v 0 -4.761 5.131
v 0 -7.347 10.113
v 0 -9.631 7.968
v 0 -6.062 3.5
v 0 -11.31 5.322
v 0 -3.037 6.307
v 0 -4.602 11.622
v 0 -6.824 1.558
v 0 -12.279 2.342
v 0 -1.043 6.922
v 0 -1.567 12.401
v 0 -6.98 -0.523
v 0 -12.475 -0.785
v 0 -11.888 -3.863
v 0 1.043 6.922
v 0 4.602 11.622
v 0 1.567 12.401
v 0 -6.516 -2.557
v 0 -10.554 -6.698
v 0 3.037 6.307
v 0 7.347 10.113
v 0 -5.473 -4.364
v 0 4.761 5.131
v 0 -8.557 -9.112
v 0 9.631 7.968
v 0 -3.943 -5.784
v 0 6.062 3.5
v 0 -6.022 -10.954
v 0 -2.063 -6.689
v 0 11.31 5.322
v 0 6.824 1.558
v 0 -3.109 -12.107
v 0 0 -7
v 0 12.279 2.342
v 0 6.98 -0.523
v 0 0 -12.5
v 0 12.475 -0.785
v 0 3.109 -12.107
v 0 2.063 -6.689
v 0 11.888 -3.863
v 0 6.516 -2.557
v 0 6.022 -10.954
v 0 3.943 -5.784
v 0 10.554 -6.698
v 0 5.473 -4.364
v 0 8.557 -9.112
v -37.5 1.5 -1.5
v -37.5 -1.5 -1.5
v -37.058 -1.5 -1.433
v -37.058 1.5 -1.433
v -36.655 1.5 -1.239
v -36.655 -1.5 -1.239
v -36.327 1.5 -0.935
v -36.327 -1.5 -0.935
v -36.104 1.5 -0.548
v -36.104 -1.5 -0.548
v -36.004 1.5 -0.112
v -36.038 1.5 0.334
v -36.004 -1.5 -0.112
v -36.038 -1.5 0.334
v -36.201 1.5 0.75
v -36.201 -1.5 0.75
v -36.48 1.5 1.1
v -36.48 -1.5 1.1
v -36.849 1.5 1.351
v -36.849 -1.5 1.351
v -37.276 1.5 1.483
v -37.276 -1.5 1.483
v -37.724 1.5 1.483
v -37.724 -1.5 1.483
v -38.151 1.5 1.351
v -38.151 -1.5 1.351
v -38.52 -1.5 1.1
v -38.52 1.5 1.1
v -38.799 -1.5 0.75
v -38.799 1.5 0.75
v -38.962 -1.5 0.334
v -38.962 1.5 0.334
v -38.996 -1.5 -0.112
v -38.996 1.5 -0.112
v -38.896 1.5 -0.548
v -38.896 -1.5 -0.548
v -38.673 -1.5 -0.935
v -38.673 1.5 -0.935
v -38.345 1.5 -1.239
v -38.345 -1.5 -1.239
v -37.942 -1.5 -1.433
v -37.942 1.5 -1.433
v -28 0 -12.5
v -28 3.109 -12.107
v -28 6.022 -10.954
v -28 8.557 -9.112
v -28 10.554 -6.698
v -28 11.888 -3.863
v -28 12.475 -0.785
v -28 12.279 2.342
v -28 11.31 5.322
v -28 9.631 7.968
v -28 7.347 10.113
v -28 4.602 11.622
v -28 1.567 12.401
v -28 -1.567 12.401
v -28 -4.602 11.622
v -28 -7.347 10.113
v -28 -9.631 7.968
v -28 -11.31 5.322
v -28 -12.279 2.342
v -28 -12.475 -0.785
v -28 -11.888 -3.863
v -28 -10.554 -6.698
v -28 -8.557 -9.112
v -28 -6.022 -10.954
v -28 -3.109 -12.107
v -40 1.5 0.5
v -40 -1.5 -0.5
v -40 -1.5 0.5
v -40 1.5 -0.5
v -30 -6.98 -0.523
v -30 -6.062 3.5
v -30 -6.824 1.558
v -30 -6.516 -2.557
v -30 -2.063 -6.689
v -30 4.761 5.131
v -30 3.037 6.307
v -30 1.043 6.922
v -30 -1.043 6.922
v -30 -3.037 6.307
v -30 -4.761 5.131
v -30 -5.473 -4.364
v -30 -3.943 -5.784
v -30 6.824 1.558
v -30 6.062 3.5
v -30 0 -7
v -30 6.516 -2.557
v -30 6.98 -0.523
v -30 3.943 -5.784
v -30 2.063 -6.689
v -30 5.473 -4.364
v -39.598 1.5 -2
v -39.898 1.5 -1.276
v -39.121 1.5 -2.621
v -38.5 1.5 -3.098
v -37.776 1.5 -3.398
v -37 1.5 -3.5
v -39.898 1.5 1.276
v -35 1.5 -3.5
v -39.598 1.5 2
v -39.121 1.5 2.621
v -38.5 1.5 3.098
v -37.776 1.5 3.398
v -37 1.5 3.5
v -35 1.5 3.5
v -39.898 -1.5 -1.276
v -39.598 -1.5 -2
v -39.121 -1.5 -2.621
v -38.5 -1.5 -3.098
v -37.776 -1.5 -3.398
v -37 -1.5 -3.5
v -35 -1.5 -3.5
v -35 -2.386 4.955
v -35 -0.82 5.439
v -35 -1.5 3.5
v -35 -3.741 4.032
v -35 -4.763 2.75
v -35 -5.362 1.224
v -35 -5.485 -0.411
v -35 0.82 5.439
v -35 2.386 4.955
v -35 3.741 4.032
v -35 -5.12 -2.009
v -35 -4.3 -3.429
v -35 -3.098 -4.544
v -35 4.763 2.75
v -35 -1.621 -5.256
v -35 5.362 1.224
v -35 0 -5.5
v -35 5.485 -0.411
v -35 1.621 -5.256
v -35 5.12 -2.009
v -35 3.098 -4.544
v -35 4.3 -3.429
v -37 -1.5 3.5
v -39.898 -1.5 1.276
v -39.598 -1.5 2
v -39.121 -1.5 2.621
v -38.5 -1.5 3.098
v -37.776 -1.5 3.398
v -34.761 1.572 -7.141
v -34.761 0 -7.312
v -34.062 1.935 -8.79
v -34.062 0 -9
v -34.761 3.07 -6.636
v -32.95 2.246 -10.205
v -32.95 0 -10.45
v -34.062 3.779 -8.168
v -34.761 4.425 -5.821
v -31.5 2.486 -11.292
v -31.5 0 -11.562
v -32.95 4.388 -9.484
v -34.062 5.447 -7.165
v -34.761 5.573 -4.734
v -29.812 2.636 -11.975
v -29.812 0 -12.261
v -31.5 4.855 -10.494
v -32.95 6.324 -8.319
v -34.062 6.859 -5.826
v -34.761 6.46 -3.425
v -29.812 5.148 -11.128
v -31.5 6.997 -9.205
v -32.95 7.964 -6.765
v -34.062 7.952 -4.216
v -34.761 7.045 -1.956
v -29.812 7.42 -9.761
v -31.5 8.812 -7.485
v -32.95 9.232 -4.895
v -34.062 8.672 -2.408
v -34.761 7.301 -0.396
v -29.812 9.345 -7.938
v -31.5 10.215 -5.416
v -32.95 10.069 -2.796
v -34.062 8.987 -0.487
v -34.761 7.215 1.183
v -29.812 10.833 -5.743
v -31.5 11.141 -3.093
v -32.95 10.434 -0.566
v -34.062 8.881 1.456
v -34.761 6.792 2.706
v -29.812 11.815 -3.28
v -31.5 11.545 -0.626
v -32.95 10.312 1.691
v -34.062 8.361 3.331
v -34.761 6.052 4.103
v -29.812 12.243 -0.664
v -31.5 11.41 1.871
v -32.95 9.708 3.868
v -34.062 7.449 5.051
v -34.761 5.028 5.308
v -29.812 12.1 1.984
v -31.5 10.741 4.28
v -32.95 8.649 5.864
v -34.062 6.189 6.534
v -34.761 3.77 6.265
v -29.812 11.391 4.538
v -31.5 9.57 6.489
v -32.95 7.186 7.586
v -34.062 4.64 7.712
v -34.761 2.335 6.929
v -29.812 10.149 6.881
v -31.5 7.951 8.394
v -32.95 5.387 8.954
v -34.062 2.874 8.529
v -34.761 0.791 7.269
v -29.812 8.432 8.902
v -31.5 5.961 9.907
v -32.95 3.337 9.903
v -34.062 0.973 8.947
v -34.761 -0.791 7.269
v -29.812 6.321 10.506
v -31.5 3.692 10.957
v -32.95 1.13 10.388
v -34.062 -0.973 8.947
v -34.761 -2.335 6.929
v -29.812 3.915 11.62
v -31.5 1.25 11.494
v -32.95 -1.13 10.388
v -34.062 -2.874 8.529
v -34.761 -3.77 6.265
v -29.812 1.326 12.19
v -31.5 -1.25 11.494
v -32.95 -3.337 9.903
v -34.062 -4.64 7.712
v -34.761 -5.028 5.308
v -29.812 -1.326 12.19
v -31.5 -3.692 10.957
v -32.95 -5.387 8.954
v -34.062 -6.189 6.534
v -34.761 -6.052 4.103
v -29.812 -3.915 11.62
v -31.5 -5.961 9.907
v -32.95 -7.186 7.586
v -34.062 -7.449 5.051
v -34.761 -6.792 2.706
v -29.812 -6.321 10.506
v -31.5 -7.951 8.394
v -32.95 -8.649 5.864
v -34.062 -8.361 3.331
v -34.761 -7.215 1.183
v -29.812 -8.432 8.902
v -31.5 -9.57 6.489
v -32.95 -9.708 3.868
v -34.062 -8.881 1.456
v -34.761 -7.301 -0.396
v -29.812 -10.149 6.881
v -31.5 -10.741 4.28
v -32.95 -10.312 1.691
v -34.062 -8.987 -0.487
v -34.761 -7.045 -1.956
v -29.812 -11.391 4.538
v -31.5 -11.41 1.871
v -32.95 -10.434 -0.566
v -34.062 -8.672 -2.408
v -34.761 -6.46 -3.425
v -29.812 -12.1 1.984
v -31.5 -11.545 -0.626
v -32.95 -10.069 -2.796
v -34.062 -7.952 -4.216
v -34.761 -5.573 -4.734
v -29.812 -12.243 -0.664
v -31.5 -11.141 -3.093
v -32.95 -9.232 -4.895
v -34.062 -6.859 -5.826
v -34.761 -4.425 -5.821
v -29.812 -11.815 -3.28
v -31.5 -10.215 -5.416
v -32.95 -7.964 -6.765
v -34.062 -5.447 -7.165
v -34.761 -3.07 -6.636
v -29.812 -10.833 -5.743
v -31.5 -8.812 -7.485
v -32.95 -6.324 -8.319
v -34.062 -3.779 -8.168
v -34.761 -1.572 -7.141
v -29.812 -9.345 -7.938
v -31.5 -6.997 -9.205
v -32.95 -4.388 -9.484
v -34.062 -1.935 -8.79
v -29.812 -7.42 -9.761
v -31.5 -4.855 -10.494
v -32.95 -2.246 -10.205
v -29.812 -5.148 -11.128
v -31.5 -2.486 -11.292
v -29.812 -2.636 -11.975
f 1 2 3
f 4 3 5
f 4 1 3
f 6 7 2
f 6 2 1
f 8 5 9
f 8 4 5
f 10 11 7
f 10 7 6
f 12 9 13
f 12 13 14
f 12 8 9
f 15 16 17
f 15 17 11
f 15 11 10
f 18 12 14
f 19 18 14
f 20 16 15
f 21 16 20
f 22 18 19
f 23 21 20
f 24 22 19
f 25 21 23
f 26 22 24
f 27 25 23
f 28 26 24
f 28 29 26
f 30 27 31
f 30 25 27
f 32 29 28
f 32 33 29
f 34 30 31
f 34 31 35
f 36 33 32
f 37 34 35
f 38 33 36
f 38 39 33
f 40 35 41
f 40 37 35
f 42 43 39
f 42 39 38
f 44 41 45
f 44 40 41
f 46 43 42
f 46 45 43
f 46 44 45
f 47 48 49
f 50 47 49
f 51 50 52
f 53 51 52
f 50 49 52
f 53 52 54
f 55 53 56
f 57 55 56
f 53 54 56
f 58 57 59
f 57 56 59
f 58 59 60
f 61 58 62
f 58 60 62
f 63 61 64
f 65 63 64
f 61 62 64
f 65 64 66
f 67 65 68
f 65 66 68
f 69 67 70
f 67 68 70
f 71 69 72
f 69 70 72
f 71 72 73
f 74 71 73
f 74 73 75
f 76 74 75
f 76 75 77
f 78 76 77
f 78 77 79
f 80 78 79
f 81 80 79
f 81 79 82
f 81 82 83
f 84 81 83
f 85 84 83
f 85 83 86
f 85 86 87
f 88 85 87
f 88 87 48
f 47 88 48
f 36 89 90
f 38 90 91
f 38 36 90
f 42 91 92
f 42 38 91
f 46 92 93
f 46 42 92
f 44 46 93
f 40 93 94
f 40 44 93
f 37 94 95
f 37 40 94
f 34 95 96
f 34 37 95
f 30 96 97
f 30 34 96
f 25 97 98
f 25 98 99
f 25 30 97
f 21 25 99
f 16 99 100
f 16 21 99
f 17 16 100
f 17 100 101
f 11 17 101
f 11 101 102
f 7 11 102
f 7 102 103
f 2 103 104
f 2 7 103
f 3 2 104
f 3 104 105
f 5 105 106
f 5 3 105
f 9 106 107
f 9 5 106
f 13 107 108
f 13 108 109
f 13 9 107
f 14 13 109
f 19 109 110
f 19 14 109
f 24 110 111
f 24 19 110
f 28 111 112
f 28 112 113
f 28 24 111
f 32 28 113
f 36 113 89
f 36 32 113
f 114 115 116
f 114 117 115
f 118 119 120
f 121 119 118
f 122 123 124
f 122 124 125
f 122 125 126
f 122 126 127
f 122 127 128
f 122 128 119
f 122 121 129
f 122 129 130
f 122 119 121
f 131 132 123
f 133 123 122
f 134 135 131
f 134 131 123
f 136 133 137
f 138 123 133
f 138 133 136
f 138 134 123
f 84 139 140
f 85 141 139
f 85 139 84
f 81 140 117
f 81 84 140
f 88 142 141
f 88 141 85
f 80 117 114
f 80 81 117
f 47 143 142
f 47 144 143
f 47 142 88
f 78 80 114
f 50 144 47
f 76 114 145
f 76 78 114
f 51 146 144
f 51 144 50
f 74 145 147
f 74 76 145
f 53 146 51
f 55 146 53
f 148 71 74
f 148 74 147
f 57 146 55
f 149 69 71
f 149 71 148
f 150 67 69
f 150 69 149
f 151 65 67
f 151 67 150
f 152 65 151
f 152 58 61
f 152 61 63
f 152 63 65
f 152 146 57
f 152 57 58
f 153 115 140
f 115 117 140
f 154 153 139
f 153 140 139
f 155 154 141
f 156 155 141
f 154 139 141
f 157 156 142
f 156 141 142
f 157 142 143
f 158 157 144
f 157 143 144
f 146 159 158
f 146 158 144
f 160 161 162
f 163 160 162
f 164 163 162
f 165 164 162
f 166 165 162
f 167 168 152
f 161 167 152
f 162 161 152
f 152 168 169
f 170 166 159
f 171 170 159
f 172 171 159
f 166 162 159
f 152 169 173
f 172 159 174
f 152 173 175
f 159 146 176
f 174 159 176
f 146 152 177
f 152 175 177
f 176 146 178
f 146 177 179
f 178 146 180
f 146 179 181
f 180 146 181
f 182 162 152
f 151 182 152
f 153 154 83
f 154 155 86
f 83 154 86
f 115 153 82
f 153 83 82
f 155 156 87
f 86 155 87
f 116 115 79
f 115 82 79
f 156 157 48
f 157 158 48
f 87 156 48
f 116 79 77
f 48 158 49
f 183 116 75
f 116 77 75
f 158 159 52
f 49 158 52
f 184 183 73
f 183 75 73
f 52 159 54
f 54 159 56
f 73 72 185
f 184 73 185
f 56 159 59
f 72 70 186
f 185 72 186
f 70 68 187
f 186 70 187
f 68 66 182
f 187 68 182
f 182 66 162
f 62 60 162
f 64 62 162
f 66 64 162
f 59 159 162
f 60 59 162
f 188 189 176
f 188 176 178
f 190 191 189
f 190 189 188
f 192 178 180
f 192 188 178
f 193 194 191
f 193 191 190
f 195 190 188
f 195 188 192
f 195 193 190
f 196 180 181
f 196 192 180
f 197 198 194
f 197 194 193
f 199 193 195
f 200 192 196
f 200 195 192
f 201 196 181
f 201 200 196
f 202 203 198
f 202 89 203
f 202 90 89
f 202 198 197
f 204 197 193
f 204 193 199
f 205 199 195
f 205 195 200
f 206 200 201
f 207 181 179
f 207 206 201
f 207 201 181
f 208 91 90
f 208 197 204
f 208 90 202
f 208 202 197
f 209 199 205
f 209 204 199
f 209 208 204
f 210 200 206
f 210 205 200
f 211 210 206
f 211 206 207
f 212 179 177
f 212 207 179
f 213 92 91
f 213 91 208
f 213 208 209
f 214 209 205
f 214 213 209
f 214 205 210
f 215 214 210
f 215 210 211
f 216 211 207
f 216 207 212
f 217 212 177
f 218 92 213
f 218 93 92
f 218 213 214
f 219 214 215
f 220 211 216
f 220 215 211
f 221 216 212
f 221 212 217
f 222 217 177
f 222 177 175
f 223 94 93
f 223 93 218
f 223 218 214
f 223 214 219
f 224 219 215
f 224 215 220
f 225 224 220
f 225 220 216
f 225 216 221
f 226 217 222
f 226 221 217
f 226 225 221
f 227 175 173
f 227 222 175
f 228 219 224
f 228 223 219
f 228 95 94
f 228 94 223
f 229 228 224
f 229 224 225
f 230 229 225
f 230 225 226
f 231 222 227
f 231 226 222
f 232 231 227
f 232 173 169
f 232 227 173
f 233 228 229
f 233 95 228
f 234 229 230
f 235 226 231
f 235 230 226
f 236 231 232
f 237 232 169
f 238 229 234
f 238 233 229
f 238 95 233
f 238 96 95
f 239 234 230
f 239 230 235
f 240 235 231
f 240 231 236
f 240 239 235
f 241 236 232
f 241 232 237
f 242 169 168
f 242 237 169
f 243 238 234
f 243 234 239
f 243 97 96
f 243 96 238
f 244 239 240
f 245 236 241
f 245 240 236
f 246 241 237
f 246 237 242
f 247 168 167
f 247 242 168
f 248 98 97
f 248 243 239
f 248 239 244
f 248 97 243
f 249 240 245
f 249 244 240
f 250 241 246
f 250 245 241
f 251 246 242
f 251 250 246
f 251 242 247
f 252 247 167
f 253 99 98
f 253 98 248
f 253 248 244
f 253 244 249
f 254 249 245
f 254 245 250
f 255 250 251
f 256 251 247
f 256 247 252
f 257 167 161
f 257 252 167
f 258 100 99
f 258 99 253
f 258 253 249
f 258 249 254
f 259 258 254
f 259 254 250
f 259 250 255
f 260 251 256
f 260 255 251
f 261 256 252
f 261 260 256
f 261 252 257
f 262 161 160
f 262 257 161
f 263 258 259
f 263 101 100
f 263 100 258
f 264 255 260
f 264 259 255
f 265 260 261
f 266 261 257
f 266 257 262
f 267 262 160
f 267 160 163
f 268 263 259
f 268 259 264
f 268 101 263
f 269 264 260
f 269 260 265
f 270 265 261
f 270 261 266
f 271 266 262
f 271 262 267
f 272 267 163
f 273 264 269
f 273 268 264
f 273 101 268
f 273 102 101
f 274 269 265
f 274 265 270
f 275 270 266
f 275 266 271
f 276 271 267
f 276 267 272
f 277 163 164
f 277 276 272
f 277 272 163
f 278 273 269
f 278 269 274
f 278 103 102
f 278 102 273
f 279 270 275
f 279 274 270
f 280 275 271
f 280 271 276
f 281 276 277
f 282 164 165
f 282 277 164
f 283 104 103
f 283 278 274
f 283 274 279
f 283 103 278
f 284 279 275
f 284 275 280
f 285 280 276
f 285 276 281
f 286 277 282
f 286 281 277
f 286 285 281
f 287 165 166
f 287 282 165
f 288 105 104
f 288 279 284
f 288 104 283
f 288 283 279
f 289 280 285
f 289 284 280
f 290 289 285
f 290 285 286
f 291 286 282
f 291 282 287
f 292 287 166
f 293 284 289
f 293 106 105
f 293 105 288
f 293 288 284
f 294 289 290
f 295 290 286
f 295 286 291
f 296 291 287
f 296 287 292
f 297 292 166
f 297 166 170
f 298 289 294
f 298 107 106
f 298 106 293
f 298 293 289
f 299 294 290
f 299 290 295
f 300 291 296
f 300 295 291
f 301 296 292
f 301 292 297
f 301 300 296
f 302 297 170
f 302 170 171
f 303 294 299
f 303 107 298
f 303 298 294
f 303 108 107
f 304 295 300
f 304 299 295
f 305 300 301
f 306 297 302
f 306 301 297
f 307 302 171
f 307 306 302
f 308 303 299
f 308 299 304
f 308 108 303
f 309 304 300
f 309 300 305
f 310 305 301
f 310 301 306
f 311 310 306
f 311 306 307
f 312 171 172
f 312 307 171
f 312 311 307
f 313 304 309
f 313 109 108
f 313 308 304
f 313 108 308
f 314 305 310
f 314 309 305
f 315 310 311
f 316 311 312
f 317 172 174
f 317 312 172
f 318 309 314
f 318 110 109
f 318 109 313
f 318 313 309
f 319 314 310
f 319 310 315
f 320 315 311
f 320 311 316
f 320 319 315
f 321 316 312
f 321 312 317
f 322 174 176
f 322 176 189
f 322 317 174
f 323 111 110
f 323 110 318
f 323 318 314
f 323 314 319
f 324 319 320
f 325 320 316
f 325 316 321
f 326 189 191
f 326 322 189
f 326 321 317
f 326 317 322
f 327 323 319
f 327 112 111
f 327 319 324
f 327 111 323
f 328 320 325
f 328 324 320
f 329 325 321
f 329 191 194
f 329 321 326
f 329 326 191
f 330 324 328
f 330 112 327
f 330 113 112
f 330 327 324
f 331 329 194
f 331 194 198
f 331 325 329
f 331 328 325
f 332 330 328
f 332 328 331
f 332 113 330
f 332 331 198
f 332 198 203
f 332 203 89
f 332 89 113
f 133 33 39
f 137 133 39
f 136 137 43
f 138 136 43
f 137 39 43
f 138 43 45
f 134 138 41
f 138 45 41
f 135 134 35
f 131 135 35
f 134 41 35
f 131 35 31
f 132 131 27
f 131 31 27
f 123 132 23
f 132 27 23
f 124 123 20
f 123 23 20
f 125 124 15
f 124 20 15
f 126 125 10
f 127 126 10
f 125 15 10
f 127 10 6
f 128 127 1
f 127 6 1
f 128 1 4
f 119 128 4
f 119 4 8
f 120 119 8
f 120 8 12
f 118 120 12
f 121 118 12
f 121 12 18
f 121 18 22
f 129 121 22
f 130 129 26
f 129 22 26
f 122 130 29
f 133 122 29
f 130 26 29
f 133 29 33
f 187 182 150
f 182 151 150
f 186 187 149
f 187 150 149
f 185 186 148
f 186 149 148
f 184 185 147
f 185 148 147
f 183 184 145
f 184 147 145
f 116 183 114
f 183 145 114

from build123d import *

# Parameters (mm, degrees)
SKETCH_1_R          = 12.5
EXTRUDE_1_DEPTH     = 35
SKETCH_3_W          = 7
SKETCH_3_H          = 3
EXTRUDE_2_DEPTH     = 5
SKETCH_4_R          = 1.5
CUT_EXTRUDE_1_DEPTH = 5
FILLET_1_R          = 3
FILLET_2_R          = 3
FILLET_3_R          = 7
SKETCH_5_R          = 7
CUT_EXTRUDE_2_DEPTH = 30


with BuildPart() as part:
    # 草图1 → 凸台-拉伸1 (new body)
    with BuildSketch(Plane(origin=(0, 0, 0), x_dir=(0, 0, -1), z_dir=(1, 0, 0))):
        Circle(SKETCH_1_R)
    extrude(amount=-EXTRUDE_1_DEPTH)

    # 草图3 → 凸台-拉伸2 (add)
    with BuildSketch(Plane.ZY.offset(35)):
        Rectangle(SKETCH_3_W, SKETCH_3_H)
    extrude(amount=EXTRUDE_2_DEPTH)

    # 草图4 → 切除-拉伸1 (cut)
    with BuildSketch(Plane.XZ.offset(1.5)):
        with Locations(Location((-37.5, 0, 0), (0, 0, 270))):
            Circle(SKETCH_4_R)
    extrude(amount=-CUT_EXTRUDE_1_DEPTH, mode=Mode.SUBTRACT)

    # 圆角1
    fillet_1_edges = [part.edges().sort_by_distance(p)[0] for p in [
        (-40, 0, 3.5),
    ]]
    fillet(fillet_1_edges, radius=FILLET_1_R)

    # 圆角2
    fillet_2_edges = [part.edges().sort_by_distance(p)[0] for p in [
        (-40, 0, -3.5),
    ]]
    fillet(fillet_2_edges, radius=FILLET_2_R)

    # 圆角3
    fillet_3_edges = [part.edges().sort_by_distance(p)[0] for p in [
        (-35, 0, 12.5),
    ]]
    fillet(fillet_3_edges, radius=FILLET_3_R)

    # 草图5 → 切除-拉伸2 (cut)
    with BuildSketch(Plane(origin=(0, 0, 0), x_dir=(0, 0, -1), z_dir=(1, 0, 0))):
        Circle(SKETCH_5_R)
    extrude(amount=-CUT_EXTRUDE_2_DEPTH, mode=Mode.SUBTRACT)


solid = part.part
